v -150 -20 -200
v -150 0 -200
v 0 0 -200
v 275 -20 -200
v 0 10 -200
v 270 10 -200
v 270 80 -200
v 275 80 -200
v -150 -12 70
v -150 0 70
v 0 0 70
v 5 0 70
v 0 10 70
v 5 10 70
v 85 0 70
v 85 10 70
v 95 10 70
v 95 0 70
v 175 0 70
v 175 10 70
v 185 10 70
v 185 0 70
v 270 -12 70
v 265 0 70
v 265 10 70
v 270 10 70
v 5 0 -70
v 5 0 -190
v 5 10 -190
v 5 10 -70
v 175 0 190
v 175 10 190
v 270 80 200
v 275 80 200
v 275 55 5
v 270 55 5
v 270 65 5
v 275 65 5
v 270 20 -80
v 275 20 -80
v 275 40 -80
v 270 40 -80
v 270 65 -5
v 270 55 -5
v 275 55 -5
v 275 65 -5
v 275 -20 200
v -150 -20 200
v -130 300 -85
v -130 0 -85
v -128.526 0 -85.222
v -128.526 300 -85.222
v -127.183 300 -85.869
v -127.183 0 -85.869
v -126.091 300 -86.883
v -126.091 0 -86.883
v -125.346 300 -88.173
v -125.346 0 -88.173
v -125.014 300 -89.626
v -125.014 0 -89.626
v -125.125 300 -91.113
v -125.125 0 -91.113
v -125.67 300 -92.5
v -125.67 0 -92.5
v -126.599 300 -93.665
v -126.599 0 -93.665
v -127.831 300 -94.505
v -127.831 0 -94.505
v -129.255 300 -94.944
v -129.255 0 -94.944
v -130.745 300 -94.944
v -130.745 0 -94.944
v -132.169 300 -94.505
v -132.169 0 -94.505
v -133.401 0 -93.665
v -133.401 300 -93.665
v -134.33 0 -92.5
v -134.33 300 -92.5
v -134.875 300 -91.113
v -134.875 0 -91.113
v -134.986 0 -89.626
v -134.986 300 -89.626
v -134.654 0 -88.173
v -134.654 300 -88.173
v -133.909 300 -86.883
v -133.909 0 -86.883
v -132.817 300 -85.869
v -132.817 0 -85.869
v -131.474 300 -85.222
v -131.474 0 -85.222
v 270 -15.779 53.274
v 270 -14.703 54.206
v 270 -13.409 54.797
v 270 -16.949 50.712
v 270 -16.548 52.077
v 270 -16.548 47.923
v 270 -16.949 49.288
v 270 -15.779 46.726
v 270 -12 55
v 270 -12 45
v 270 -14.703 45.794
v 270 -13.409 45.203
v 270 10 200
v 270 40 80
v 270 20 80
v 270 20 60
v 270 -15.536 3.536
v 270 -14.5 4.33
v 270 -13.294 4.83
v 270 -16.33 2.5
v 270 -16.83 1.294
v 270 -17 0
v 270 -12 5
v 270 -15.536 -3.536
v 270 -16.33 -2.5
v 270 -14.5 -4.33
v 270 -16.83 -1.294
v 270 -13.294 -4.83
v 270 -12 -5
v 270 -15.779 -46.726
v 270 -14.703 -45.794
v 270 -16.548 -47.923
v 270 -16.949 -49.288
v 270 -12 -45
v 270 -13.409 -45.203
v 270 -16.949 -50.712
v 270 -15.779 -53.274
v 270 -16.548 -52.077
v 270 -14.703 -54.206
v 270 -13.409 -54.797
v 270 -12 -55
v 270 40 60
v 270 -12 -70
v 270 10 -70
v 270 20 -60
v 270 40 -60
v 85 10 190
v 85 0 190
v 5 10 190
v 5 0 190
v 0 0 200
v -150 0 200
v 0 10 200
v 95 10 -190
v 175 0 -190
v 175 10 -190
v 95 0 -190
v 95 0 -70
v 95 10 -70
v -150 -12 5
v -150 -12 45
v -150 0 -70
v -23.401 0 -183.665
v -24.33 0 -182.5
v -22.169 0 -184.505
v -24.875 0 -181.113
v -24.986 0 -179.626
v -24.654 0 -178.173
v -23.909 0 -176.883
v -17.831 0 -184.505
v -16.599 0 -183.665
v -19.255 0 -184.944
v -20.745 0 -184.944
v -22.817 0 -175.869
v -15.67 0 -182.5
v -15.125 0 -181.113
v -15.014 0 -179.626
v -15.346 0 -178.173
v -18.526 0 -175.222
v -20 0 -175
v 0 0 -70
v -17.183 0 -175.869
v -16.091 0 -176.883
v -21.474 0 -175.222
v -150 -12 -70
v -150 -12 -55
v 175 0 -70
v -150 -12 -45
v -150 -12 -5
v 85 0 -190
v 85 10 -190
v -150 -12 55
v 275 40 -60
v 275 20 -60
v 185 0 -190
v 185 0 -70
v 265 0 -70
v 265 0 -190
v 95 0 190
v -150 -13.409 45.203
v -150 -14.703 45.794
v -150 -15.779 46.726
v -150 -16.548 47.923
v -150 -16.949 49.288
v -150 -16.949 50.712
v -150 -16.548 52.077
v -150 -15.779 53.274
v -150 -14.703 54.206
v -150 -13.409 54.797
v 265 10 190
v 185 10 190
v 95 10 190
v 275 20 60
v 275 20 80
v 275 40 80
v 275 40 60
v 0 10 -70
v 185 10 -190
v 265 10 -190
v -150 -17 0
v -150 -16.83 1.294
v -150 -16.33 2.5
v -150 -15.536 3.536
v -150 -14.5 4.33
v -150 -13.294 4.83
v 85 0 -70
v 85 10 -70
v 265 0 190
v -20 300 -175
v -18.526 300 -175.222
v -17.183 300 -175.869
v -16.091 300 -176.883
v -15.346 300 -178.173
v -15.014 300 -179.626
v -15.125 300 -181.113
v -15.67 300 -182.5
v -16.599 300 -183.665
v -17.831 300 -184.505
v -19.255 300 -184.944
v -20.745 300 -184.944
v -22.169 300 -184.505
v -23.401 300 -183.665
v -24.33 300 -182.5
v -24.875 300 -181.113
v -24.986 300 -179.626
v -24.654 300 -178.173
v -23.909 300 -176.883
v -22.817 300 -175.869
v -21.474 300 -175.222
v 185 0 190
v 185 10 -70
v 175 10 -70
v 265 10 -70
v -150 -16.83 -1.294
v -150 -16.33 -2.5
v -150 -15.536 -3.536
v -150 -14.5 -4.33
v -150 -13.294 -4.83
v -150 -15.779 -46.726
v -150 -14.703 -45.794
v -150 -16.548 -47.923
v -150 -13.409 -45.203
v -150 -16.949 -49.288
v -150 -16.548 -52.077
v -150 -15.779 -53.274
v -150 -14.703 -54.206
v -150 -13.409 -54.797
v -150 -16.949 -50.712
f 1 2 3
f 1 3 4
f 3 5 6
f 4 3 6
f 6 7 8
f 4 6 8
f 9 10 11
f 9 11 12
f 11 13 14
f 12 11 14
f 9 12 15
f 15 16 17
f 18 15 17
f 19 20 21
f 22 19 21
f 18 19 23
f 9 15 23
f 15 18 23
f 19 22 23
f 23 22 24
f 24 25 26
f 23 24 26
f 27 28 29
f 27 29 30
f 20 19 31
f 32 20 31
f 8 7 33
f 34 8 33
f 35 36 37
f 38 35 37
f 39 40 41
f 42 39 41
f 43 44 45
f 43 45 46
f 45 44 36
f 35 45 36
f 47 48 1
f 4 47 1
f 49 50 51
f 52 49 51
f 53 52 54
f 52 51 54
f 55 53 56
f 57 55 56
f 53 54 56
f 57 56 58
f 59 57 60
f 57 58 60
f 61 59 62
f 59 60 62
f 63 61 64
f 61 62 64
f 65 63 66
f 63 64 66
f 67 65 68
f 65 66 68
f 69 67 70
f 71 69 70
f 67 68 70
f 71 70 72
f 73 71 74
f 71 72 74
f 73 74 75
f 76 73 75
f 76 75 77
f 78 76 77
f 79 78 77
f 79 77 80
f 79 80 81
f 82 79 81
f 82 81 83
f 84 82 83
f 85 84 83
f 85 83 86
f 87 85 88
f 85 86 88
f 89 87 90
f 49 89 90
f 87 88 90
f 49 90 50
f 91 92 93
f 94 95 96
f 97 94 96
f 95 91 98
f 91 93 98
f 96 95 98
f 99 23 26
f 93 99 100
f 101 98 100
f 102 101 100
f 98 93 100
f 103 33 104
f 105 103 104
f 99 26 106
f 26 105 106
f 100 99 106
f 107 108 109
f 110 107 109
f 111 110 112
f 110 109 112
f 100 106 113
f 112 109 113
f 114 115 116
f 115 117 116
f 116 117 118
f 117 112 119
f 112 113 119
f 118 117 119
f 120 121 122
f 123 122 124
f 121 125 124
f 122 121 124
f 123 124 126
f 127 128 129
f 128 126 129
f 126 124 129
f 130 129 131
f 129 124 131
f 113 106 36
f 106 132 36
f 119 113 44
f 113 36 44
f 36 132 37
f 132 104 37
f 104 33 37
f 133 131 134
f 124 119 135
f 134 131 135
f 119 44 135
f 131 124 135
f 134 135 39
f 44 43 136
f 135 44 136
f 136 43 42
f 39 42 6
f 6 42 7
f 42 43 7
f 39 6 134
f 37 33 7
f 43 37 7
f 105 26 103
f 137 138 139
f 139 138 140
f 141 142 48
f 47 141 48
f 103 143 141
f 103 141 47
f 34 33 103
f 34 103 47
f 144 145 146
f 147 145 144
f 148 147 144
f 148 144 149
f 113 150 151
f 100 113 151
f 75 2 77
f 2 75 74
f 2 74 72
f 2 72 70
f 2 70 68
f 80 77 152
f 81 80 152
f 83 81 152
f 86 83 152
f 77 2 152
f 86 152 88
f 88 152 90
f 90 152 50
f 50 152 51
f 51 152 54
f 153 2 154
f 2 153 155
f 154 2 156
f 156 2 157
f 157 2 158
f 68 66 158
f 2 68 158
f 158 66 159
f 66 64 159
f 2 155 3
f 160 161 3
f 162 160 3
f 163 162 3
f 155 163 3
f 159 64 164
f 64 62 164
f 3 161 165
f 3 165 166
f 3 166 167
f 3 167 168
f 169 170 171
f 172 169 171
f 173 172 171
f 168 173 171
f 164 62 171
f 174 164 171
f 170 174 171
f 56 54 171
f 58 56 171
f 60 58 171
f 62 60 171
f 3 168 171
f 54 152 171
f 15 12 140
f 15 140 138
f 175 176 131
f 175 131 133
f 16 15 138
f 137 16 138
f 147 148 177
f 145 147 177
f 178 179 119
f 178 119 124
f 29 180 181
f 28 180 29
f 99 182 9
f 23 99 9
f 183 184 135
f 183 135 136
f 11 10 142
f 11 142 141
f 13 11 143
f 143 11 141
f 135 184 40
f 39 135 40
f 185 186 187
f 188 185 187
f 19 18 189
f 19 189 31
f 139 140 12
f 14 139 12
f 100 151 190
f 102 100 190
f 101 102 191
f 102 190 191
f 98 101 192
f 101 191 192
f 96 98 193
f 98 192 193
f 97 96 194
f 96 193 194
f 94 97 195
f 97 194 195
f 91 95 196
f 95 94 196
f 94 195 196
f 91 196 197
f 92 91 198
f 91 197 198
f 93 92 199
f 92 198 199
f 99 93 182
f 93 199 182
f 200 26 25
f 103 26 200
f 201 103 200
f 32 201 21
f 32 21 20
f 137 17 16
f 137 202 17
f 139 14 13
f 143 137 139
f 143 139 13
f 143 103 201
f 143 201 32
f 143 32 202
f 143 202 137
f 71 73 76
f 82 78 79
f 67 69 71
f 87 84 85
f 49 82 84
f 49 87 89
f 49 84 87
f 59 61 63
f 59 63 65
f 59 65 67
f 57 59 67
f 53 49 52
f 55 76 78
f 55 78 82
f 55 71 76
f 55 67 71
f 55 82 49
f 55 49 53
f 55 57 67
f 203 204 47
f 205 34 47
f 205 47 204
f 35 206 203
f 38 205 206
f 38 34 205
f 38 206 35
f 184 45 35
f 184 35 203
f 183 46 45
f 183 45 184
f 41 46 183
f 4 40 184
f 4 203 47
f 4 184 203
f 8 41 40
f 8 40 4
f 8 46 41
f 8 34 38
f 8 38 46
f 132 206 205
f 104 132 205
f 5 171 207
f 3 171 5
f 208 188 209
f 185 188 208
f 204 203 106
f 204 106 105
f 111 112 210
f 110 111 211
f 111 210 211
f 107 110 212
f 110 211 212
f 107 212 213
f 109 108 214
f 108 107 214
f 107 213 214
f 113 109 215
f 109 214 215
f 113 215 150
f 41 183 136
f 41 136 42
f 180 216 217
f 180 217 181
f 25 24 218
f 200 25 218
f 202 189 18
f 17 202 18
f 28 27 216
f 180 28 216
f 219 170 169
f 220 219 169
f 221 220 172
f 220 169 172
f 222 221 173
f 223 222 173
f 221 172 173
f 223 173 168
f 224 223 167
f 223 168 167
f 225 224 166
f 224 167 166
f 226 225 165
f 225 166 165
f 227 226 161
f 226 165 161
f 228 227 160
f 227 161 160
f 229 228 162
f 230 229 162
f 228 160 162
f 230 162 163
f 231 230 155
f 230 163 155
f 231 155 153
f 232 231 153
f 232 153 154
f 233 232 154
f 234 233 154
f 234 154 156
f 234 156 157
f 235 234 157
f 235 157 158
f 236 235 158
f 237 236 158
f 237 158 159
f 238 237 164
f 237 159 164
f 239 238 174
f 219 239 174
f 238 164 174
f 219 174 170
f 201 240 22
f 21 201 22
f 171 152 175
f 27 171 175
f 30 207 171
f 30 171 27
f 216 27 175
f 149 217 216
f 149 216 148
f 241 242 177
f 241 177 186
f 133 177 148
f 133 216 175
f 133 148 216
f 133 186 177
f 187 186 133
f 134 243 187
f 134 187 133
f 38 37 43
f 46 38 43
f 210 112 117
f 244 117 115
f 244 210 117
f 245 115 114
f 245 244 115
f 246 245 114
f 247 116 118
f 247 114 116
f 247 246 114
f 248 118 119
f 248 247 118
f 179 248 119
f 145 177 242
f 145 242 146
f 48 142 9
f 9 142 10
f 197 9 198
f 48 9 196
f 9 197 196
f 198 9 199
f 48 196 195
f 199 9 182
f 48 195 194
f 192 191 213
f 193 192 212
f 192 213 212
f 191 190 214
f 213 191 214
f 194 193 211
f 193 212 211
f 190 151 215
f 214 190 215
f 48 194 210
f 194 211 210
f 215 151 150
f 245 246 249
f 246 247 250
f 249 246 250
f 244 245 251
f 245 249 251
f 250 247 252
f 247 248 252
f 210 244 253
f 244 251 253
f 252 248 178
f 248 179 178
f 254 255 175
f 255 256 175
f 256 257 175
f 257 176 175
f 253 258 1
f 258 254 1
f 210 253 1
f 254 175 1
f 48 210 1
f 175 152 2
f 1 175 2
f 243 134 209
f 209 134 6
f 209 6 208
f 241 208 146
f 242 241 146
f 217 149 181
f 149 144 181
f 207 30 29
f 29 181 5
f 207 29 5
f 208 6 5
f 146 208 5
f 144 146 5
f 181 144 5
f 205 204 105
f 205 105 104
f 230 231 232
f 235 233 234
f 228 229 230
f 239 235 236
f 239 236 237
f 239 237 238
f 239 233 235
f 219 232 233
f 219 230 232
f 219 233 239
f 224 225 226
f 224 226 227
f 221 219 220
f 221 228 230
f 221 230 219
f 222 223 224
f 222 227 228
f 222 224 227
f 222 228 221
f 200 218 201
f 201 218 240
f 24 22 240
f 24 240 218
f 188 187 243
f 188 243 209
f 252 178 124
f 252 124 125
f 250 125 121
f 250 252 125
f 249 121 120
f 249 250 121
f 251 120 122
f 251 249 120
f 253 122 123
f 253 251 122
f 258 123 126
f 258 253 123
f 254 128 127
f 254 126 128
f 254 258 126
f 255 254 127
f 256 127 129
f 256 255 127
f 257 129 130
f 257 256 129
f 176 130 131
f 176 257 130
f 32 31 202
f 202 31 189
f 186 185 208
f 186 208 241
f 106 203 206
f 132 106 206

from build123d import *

# Parameters (mm, degrees)
PARKING_DEPTH       = 10
PARKINGS_COUNT      = 3
PARKINGS_PITCH      = 90
RIGHTWALL_DEPTH     = 5
LASERHOLE_REACH     = 351.321
SKETCH2_W           = 20
SKETCH2_H           = 20
SKETCH5_W           = 420
SKETCH5_H           = 130
PARKINGBOTTOM_DEPTH = 20
CARTBOTTOM_DEPTH    = 425
SKETCH9_R           = 5
THREADEDROD_DEPTH   = 300


with BuildPart() as part:
    # SingleLot → Parking (new body)
    with BuildSketch(Plane(origin=(0, 0, 0), x_dir=(1, 0, 0), z_dir=(0, 1, 0))):
        Polygon((5, 70), (0, 70), (0, 200), (90, 200), (90, 70), (85, 70), (85, 190), (5, 190), align=None)
    parking = extrude(amount=PARKING_DEPTH)

    # Parkings: Parking ×3
    with Locations(*[(i * PARKINGS_PITCH, 0, 0) for i in range(1, PARKINGS_COUNT)]):
        add(parking)

    # Wall → RightWall (add)
    with BuildSketch(Plane(origin=(270, 0, 0), x_dir=(0, 0, -1), z_dir=(1, 0, 0))):
        Polygon((0, 65), (0, 80), (200, 80), (200, 0), (200, -20), (0, -20), (0, 0), (0, 55), (5, 55), (5, 65), align=None)
    extrude(amount=RIGHTWALL_DEPTH)

    # Sketch2 → LaserHole (cut, up to next)
    with BuildSketch(Plane(origin=(275, 0, 0), x_dir=(0, 0, -1), z_dir=(1, 0, 0)), mode=Mode.PRIVATE) as laserhole_sk1:
        with Locations((70, 30)):
            Rectangle(SKETCH2_W, SKETCH2_H)
    laserhole_tool1 = extrude(laserhole_sk1.sketch, amount=-LASERHOLE_REACH, mode=Mode.PRIVATE) & part.part
    add(laserhole_tool1.solids().sort_by_distance((275, 30, -70))[0], mode=Mode.SUBTRACT)

    # Sketch5 → ParkingBottom (add)
    with BuildSketch(Plane.XZ):
        with Locations((60, -135)):
            Rectangle(SKETCH5_W, SKETCH5_H)
    extrude(amount=PARKINGBOTTOM_DEPTH)

    # Sketch8 → CartBottom (add)
    with BuildSketch(Plane.ZY.offset(150)):
        with BuildLine():
            Line((-70, -20), (0, -20))
            Line((0, -20), (0, -17))
            ThreePointArc((0, -17), (-3.535533906, -15.535533906), (-5, -12))
            Line((-5, -12), (-45, -12))
            ThreePointArc((-45, -12), (-50, -17), (-55, -12))
            Line((-55, -12), (-70, -12))
            Line((-70, -12), (-70, -20))
        make_face()
    extrude(amount=-CARTBOTTOM_DEPTH)

    # Mirror8: part across plane


with BuildPart() as part_1:
    add(part.part)
    add(part.part.mirror(Plane.XY))

    # Sketch9 → ThreadedRod (add)
    with BuildSketch(Plane(origin=(0, 0, 0), x_dir=(1, 0, 0), z_dir=(0, 1, 0))):
        with Locations(Location((-130, 90, 0), (0, 0, 270))):
            Circle(SKETCH9_R)
        with Locations(Location((-20, 180, 0), (0, 0, 270))):
            Circle(SKETCH9_R)
    extrude(amount=THREADEDROD_DEPTH)


solid = part_1.part
